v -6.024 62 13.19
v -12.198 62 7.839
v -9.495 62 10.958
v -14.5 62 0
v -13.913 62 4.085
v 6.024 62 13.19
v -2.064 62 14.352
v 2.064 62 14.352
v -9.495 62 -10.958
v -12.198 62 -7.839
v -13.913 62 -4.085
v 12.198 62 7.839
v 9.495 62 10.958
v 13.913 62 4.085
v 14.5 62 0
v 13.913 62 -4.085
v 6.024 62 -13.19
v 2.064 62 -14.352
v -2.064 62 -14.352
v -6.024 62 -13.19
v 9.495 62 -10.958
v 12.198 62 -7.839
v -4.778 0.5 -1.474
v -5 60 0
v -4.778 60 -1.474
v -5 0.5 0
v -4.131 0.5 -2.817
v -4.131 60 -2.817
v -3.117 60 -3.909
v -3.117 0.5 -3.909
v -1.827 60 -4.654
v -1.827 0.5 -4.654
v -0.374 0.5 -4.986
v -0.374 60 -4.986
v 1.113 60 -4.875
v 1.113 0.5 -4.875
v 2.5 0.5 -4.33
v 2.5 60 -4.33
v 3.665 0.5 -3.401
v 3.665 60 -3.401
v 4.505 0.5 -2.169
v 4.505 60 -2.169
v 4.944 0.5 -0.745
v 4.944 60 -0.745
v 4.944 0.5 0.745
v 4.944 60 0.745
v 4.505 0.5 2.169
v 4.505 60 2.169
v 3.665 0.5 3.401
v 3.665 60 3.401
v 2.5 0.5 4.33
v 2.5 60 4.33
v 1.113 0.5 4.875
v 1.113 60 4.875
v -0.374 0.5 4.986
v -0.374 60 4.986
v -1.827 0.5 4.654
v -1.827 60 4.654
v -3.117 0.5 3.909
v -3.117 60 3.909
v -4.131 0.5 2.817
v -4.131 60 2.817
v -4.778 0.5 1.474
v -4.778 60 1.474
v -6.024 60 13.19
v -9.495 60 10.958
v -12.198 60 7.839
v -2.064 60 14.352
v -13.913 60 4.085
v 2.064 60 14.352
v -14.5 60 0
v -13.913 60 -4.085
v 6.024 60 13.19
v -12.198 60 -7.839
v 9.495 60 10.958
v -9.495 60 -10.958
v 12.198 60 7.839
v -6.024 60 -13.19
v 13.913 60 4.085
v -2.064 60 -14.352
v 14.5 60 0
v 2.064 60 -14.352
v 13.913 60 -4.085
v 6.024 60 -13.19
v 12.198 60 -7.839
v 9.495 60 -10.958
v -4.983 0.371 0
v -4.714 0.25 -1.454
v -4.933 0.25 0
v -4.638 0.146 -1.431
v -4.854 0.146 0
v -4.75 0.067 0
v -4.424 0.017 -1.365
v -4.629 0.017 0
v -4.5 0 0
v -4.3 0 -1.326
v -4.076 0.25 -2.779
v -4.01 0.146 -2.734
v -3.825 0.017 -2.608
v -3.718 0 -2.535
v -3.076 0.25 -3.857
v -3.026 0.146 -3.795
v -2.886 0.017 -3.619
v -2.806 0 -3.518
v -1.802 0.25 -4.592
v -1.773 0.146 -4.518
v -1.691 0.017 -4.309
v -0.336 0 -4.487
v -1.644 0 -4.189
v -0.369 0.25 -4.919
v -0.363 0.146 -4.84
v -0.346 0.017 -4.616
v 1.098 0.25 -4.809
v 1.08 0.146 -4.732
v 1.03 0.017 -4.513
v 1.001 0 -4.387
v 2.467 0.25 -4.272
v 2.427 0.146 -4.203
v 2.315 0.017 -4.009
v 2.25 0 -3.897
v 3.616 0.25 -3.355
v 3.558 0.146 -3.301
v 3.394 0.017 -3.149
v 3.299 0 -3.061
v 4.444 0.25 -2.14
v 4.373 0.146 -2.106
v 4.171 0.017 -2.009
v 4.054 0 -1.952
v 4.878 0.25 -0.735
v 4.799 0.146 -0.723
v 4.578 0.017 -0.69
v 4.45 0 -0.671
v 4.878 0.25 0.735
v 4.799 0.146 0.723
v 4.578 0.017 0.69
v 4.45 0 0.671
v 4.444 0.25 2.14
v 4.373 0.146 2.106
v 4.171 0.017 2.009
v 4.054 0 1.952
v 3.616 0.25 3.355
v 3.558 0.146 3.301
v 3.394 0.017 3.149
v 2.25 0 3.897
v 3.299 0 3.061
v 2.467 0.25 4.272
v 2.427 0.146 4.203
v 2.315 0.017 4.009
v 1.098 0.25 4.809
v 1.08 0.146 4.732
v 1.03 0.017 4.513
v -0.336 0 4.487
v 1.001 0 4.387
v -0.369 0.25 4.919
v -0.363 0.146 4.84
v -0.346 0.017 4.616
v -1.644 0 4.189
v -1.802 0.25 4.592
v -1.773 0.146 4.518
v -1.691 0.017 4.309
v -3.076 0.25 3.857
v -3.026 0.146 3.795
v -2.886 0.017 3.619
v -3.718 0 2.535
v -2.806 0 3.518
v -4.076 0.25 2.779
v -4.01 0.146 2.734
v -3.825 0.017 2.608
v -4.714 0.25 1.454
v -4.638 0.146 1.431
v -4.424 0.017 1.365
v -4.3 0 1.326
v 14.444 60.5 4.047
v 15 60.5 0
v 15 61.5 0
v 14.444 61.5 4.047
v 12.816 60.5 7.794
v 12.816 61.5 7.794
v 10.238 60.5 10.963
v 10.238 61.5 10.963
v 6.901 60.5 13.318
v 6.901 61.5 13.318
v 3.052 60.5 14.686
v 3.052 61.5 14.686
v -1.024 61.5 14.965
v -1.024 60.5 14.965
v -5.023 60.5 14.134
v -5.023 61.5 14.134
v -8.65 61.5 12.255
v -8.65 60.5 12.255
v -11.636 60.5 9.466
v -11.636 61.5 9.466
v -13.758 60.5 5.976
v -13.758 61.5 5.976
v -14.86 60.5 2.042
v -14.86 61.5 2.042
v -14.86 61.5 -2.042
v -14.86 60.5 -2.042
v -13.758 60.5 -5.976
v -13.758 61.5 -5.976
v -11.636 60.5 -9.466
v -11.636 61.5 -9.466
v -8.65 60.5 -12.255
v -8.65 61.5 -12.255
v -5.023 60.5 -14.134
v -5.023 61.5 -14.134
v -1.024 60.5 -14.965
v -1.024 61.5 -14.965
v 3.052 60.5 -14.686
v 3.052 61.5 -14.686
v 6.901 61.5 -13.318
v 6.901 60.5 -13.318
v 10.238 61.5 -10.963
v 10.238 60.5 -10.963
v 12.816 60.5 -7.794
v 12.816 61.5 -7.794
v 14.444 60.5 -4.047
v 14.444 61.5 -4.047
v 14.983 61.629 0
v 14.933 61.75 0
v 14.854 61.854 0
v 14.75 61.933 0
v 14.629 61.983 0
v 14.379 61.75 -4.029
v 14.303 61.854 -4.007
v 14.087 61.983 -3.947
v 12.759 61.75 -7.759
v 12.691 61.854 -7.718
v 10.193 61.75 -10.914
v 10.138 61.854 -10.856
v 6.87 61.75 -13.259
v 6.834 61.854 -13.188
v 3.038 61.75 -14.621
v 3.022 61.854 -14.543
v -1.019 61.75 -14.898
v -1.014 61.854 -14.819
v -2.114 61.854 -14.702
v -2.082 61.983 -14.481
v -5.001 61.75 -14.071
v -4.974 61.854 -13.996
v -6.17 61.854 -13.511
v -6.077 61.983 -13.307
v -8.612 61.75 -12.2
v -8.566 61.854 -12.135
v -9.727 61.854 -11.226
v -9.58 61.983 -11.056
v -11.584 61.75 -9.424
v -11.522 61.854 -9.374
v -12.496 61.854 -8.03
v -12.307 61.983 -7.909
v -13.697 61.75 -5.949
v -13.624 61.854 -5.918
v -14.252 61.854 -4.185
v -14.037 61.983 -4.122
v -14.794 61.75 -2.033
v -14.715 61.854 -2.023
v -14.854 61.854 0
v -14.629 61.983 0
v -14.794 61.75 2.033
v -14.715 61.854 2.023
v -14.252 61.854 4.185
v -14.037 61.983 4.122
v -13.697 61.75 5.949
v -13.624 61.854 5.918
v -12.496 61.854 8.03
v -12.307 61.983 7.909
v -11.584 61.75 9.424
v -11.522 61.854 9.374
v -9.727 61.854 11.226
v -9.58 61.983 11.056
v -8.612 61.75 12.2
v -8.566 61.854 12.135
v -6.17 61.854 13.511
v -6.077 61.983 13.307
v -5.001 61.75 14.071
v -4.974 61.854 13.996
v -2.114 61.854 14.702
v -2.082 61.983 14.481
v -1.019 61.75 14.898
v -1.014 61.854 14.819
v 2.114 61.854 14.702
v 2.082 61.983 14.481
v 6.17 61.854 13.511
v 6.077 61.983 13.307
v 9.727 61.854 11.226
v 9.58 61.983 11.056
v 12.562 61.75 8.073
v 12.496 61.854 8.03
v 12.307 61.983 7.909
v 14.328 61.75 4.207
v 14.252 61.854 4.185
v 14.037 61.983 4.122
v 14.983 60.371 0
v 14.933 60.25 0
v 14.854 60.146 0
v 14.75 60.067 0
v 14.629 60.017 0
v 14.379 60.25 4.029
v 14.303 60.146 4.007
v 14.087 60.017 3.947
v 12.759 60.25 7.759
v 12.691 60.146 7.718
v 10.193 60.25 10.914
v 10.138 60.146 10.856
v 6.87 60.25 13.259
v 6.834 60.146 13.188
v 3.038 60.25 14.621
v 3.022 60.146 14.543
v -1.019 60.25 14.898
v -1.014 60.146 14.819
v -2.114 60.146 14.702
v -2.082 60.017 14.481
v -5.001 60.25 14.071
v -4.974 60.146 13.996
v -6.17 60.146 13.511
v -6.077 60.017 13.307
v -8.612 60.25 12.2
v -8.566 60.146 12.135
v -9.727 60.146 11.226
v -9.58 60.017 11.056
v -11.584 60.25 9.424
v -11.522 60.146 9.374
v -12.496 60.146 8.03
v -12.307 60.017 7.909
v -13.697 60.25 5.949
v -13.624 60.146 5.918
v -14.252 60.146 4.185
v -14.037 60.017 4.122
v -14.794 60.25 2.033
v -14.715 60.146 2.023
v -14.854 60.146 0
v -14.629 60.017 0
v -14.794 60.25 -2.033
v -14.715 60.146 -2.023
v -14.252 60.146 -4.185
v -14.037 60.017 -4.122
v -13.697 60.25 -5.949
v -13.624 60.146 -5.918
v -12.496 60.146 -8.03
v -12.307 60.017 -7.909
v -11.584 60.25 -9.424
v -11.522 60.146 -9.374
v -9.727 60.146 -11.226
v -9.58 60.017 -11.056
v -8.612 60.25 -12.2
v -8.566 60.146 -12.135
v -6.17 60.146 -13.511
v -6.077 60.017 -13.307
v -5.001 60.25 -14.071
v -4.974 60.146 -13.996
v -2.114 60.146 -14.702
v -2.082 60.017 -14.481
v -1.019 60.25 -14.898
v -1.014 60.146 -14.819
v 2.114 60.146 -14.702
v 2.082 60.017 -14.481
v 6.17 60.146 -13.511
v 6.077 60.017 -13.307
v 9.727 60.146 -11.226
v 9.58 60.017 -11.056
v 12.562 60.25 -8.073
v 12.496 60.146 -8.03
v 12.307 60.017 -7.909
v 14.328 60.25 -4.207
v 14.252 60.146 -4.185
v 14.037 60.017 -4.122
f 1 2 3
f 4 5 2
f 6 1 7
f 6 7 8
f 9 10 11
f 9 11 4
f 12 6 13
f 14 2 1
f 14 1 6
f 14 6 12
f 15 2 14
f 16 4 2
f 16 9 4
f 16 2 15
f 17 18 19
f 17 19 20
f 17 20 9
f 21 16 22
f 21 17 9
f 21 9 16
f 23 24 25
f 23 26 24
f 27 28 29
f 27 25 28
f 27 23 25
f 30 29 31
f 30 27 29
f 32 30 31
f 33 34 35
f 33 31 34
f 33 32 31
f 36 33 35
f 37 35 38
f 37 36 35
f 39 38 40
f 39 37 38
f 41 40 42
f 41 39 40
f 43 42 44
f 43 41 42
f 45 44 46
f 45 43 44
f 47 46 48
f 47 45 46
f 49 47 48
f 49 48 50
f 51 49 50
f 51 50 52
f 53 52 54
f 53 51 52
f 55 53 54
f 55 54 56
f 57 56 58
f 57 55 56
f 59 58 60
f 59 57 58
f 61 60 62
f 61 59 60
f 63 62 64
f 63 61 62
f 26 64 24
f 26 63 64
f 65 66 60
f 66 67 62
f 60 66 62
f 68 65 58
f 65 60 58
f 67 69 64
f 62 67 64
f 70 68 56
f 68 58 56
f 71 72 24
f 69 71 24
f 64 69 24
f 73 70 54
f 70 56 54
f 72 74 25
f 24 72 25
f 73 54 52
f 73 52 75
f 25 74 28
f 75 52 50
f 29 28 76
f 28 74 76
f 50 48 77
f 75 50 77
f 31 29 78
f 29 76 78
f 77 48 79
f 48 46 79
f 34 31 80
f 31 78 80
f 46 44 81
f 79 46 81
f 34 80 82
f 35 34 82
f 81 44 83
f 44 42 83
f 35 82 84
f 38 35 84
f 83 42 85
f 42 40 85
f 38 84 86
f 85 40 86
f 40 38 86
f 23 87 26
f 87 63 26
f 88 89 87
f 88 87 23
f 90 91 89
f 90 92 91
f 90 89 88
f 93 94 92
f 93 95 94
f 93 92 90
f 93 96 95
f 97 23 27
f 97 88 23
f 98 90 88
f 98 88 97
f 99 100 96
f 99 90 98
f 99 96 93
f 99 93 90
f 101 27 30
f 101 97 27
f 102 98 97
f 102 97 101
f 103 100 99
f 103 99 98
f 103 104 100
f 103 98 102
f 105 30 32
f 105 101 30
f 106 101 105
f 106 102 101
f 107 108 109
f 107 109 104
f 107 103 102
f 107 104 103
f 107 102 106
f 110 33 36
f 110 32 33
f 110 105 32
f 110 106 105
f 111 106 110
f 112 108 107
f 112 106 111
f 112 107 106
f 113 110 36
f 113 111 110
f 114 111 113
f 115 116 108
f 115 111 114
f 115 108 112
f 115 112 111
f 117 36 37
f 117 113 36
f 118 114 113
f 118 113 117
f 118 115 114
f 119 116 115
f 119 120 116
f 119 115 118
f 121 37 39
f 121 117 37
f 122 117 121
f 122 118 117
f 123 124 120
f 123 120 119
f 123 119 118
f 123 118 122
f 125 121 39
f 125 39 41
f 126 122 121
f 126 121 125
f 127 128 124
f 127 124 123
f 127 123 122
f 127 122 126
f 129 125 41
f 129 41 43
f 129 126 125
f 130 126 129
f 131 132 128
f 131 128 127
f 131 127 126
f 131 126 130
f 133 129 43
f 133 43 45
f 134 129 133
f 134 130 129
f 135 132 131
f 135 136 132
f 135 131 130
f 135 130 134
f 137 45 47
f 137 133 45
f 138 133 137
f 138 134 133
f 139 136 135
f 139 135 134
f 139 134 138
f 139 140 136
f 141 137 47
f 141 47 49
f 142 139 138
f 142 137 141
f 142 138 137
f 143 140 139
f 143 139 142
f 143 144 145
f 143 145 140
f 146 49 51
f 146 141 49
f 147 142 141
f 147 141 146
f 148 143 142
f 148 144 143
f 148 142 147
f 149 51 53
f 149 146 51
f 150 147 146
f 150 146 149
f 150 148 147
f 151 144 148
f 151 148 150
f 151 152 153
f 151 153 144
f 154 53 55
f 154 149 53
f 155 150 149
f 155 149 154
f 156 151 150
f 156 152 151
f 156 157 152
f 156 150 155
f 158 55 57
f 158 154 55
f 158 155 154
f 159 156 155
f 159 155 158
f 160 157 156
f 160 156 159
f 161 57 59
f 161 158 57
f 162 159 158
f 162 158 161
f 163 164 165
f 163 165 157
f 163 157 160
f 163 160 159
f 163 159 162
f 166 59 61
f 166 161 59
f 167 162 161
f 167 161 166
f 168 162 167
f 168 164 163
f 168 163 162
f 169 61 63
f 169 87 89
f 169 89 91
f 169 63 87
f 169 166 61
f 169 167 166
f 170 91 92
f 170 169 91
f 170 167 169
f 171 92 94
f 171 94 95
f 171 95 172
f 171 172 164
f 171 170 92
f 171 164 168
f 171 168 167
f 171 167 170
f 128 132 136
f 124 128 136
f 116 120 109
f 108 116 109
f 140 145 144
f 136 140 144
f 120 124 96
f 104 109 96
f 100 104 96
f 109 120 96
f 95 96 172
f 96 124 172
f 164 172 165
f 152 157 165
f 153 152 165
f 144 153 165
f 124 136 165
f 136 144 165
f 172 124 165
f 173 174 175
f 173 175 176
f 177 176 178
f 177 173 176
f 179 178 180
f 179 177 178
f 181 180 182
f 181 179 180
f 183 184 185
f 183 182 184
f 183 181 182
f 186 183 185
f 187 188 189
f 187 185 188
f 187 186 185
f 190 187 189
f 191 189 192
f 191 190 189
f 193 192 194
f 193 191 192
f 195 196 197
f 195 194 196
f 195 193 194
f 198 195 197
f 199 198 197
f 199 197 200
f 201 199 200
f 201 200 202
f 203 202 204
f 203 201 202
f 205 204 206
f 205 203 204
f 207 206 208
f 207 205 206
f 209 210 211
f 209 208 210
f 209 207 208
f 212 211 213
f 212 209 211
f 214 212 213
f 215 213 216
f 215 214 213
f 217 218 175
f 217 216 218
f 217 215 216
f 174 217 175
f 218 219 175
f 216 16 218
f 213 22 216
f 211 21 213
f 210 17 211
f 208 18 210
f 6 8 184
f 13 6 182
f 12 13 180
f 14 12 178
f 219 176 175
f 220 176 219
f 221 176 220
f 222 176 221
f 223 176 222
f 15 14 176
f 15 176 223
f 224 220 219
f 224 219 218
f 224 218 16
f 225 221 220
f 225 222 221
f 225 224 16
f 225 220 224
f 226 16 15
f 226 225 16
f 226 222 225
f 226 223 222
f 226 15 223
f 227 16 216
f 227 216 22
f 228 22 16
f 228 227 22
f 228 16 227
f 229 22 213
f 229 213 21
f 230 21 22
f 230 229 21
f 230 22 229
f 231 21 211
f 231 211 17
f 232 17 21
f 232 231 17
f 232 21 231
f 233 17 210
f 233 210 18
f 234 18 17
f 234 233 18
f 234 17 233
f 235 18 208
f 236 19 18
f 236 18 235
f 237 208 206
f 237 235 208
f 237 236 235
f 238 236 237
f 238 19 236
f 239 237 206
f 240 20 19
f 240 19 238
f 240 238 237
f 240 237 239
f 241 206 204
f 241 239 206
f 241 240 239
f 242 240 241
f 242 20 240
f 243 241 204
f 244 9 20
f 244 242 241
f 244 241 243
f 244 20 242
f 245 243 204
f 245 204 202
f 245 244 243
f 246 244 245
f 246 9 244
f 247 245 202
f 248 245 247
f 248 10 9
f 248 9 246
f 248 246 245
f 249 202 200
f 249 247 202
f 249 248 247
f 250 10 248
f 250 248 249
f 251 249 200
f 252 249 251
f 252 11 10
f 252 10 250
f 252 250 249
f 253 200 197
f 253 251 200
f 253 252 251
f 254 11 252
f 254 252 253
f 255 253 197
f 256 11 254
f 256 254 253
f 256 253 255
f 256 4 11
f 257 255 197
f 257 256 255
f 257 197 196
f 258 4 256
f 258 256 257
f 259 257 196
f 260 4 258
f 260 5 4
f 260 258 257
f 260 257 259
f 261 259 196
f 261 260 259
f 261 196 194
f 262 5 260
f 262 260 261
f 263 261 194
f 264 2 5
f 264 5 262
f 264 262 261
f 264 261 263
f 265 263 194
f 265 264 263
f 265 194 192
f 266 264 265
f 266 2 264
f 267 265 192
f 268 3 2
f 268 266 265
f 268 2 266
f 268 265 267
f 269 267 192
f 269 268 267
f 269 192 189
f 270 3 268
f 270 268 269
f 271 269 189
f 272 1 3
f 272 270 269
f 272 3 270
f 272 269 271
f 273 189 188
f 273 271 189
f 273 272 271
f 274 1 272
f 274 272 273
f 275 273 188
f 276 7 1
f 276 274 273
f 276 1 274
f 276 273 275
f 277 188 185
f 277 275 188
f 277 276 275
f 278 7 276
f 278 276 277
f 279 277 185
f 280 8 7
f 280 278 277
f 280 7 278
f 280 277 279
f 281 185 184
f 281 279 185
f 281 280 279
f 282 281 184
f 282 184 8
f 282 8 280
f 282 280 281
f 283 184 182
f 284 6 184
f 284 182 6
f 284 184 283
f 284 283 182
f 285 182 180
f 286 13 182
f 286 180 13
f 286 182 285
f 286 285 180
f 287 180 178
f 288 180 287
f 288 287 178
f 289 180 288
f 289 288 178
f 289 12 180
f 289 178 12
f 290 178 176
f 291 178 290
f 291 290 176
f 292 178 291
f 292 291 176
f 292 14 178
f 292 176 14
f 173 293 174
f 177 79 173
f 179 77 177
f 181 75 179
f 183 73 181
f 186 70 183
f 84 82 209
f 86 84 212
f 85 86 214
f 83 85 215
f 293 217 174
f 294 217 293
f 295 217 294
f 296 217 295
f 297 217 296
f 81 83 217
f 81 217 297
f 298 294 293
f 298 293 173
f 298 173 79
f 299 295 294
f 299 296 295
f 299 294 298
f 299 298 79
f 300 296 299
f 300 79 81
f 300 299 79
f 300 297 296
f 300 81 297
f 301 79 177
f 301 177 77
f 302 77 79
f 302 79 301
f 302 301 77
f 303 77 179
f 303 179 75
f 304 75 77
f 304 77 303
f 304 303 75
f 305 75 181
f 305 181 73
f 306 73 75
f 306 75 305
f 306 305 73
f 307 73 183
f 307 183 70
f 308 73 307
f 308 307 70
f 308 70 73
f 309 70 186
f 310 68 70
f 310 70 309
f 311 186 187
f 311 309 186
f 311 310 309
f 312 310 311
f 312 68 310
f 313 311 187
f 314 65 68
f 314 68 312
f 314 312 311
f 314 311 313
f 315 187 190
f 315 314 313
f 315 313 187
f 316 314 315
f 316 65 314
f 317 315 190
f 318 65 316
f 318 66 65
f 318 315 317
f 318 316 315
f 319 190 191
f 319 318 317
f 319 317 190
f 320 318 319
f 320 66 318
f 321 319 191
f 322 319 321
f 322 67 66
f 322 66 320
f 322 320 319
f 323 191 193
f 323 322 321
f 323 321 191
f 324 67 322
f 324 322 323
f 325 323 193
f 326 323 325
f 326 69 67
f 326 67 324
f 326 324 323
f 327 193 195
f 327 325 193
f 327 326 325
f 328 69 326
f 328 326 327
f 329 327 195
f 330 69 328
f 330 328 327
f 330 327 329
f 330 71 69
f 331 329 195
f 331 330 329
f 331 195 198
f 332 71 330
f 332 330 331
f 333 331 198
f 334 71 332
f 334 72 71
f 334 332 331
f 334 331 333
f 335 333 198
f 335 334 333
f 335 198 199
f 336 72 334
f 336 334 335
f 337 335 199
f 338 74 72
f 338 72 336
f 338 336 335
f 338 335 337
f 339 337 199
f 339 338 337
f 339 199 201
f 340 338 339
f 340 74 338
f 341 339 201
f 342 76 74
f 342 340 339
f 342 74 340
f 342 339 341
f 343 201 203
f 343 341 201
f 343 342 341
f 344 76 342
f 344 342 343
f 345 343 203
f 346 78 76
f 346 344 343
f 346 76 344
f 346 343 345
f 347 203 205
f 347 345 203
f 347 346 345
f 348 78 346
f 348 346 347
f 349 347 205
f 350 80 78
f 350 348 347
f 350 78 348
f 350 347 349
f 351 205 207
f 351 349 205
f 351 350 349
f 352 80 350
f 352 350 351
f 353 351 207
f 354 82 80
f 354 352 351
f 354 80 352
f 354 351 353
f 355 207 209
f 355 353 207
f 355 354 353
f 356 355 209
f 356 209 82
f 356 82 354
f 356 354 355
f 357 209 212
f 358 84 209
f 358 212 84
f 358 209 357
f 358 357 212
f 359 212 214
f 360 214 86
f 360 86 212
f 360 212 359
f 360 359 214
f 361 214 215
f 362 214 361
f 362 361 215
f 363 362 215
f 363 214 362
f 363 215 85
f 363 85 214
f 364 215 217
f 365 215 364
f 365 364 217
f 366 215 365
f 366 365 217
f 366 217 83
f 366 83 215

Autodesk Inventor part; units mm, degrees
ref_plane "YZ Plane" through (0, 0, 0) normal (1, 0, 0) x (0, 1, 0)
ref_plane "XZ Plane" through (0, 0, 0) normal (0, 1, 0) x (-1, 0, 0)
ref_plane "XY Plane" through (0, 0, 0) normal (0, 0, 1) x (1, 0, 0)
sketch "Boceto1" plane through (0, 0, 0) normal (0, 1, 0) x (-1, 0, 0)
  circle A0 centre (0, 0) radius 5
  dimension "d0" = 10
extrude "Extrusión1" add sketch "Boceto1" along normal blind 60
sketch "Boceto2" plane through (0, 60, 0) normal (0, 1, 0) x (1, 0, 0)
  circle A0 centre (0, 0) radius 15
  dimension "d3" = 30
extrude "Extrusión2" add sketch "Boceto2" along normal blind 2
fillet "Empalme1" radius 0.5 1 edges at (-15, 62, 0)
fillet "Empalme2" radius 0.5 1 edges at (-15, 60, 0)
fillet "Empalme3" radius 0.5 1 edges at (5, 0, 0)
properties part number "Pasador"
